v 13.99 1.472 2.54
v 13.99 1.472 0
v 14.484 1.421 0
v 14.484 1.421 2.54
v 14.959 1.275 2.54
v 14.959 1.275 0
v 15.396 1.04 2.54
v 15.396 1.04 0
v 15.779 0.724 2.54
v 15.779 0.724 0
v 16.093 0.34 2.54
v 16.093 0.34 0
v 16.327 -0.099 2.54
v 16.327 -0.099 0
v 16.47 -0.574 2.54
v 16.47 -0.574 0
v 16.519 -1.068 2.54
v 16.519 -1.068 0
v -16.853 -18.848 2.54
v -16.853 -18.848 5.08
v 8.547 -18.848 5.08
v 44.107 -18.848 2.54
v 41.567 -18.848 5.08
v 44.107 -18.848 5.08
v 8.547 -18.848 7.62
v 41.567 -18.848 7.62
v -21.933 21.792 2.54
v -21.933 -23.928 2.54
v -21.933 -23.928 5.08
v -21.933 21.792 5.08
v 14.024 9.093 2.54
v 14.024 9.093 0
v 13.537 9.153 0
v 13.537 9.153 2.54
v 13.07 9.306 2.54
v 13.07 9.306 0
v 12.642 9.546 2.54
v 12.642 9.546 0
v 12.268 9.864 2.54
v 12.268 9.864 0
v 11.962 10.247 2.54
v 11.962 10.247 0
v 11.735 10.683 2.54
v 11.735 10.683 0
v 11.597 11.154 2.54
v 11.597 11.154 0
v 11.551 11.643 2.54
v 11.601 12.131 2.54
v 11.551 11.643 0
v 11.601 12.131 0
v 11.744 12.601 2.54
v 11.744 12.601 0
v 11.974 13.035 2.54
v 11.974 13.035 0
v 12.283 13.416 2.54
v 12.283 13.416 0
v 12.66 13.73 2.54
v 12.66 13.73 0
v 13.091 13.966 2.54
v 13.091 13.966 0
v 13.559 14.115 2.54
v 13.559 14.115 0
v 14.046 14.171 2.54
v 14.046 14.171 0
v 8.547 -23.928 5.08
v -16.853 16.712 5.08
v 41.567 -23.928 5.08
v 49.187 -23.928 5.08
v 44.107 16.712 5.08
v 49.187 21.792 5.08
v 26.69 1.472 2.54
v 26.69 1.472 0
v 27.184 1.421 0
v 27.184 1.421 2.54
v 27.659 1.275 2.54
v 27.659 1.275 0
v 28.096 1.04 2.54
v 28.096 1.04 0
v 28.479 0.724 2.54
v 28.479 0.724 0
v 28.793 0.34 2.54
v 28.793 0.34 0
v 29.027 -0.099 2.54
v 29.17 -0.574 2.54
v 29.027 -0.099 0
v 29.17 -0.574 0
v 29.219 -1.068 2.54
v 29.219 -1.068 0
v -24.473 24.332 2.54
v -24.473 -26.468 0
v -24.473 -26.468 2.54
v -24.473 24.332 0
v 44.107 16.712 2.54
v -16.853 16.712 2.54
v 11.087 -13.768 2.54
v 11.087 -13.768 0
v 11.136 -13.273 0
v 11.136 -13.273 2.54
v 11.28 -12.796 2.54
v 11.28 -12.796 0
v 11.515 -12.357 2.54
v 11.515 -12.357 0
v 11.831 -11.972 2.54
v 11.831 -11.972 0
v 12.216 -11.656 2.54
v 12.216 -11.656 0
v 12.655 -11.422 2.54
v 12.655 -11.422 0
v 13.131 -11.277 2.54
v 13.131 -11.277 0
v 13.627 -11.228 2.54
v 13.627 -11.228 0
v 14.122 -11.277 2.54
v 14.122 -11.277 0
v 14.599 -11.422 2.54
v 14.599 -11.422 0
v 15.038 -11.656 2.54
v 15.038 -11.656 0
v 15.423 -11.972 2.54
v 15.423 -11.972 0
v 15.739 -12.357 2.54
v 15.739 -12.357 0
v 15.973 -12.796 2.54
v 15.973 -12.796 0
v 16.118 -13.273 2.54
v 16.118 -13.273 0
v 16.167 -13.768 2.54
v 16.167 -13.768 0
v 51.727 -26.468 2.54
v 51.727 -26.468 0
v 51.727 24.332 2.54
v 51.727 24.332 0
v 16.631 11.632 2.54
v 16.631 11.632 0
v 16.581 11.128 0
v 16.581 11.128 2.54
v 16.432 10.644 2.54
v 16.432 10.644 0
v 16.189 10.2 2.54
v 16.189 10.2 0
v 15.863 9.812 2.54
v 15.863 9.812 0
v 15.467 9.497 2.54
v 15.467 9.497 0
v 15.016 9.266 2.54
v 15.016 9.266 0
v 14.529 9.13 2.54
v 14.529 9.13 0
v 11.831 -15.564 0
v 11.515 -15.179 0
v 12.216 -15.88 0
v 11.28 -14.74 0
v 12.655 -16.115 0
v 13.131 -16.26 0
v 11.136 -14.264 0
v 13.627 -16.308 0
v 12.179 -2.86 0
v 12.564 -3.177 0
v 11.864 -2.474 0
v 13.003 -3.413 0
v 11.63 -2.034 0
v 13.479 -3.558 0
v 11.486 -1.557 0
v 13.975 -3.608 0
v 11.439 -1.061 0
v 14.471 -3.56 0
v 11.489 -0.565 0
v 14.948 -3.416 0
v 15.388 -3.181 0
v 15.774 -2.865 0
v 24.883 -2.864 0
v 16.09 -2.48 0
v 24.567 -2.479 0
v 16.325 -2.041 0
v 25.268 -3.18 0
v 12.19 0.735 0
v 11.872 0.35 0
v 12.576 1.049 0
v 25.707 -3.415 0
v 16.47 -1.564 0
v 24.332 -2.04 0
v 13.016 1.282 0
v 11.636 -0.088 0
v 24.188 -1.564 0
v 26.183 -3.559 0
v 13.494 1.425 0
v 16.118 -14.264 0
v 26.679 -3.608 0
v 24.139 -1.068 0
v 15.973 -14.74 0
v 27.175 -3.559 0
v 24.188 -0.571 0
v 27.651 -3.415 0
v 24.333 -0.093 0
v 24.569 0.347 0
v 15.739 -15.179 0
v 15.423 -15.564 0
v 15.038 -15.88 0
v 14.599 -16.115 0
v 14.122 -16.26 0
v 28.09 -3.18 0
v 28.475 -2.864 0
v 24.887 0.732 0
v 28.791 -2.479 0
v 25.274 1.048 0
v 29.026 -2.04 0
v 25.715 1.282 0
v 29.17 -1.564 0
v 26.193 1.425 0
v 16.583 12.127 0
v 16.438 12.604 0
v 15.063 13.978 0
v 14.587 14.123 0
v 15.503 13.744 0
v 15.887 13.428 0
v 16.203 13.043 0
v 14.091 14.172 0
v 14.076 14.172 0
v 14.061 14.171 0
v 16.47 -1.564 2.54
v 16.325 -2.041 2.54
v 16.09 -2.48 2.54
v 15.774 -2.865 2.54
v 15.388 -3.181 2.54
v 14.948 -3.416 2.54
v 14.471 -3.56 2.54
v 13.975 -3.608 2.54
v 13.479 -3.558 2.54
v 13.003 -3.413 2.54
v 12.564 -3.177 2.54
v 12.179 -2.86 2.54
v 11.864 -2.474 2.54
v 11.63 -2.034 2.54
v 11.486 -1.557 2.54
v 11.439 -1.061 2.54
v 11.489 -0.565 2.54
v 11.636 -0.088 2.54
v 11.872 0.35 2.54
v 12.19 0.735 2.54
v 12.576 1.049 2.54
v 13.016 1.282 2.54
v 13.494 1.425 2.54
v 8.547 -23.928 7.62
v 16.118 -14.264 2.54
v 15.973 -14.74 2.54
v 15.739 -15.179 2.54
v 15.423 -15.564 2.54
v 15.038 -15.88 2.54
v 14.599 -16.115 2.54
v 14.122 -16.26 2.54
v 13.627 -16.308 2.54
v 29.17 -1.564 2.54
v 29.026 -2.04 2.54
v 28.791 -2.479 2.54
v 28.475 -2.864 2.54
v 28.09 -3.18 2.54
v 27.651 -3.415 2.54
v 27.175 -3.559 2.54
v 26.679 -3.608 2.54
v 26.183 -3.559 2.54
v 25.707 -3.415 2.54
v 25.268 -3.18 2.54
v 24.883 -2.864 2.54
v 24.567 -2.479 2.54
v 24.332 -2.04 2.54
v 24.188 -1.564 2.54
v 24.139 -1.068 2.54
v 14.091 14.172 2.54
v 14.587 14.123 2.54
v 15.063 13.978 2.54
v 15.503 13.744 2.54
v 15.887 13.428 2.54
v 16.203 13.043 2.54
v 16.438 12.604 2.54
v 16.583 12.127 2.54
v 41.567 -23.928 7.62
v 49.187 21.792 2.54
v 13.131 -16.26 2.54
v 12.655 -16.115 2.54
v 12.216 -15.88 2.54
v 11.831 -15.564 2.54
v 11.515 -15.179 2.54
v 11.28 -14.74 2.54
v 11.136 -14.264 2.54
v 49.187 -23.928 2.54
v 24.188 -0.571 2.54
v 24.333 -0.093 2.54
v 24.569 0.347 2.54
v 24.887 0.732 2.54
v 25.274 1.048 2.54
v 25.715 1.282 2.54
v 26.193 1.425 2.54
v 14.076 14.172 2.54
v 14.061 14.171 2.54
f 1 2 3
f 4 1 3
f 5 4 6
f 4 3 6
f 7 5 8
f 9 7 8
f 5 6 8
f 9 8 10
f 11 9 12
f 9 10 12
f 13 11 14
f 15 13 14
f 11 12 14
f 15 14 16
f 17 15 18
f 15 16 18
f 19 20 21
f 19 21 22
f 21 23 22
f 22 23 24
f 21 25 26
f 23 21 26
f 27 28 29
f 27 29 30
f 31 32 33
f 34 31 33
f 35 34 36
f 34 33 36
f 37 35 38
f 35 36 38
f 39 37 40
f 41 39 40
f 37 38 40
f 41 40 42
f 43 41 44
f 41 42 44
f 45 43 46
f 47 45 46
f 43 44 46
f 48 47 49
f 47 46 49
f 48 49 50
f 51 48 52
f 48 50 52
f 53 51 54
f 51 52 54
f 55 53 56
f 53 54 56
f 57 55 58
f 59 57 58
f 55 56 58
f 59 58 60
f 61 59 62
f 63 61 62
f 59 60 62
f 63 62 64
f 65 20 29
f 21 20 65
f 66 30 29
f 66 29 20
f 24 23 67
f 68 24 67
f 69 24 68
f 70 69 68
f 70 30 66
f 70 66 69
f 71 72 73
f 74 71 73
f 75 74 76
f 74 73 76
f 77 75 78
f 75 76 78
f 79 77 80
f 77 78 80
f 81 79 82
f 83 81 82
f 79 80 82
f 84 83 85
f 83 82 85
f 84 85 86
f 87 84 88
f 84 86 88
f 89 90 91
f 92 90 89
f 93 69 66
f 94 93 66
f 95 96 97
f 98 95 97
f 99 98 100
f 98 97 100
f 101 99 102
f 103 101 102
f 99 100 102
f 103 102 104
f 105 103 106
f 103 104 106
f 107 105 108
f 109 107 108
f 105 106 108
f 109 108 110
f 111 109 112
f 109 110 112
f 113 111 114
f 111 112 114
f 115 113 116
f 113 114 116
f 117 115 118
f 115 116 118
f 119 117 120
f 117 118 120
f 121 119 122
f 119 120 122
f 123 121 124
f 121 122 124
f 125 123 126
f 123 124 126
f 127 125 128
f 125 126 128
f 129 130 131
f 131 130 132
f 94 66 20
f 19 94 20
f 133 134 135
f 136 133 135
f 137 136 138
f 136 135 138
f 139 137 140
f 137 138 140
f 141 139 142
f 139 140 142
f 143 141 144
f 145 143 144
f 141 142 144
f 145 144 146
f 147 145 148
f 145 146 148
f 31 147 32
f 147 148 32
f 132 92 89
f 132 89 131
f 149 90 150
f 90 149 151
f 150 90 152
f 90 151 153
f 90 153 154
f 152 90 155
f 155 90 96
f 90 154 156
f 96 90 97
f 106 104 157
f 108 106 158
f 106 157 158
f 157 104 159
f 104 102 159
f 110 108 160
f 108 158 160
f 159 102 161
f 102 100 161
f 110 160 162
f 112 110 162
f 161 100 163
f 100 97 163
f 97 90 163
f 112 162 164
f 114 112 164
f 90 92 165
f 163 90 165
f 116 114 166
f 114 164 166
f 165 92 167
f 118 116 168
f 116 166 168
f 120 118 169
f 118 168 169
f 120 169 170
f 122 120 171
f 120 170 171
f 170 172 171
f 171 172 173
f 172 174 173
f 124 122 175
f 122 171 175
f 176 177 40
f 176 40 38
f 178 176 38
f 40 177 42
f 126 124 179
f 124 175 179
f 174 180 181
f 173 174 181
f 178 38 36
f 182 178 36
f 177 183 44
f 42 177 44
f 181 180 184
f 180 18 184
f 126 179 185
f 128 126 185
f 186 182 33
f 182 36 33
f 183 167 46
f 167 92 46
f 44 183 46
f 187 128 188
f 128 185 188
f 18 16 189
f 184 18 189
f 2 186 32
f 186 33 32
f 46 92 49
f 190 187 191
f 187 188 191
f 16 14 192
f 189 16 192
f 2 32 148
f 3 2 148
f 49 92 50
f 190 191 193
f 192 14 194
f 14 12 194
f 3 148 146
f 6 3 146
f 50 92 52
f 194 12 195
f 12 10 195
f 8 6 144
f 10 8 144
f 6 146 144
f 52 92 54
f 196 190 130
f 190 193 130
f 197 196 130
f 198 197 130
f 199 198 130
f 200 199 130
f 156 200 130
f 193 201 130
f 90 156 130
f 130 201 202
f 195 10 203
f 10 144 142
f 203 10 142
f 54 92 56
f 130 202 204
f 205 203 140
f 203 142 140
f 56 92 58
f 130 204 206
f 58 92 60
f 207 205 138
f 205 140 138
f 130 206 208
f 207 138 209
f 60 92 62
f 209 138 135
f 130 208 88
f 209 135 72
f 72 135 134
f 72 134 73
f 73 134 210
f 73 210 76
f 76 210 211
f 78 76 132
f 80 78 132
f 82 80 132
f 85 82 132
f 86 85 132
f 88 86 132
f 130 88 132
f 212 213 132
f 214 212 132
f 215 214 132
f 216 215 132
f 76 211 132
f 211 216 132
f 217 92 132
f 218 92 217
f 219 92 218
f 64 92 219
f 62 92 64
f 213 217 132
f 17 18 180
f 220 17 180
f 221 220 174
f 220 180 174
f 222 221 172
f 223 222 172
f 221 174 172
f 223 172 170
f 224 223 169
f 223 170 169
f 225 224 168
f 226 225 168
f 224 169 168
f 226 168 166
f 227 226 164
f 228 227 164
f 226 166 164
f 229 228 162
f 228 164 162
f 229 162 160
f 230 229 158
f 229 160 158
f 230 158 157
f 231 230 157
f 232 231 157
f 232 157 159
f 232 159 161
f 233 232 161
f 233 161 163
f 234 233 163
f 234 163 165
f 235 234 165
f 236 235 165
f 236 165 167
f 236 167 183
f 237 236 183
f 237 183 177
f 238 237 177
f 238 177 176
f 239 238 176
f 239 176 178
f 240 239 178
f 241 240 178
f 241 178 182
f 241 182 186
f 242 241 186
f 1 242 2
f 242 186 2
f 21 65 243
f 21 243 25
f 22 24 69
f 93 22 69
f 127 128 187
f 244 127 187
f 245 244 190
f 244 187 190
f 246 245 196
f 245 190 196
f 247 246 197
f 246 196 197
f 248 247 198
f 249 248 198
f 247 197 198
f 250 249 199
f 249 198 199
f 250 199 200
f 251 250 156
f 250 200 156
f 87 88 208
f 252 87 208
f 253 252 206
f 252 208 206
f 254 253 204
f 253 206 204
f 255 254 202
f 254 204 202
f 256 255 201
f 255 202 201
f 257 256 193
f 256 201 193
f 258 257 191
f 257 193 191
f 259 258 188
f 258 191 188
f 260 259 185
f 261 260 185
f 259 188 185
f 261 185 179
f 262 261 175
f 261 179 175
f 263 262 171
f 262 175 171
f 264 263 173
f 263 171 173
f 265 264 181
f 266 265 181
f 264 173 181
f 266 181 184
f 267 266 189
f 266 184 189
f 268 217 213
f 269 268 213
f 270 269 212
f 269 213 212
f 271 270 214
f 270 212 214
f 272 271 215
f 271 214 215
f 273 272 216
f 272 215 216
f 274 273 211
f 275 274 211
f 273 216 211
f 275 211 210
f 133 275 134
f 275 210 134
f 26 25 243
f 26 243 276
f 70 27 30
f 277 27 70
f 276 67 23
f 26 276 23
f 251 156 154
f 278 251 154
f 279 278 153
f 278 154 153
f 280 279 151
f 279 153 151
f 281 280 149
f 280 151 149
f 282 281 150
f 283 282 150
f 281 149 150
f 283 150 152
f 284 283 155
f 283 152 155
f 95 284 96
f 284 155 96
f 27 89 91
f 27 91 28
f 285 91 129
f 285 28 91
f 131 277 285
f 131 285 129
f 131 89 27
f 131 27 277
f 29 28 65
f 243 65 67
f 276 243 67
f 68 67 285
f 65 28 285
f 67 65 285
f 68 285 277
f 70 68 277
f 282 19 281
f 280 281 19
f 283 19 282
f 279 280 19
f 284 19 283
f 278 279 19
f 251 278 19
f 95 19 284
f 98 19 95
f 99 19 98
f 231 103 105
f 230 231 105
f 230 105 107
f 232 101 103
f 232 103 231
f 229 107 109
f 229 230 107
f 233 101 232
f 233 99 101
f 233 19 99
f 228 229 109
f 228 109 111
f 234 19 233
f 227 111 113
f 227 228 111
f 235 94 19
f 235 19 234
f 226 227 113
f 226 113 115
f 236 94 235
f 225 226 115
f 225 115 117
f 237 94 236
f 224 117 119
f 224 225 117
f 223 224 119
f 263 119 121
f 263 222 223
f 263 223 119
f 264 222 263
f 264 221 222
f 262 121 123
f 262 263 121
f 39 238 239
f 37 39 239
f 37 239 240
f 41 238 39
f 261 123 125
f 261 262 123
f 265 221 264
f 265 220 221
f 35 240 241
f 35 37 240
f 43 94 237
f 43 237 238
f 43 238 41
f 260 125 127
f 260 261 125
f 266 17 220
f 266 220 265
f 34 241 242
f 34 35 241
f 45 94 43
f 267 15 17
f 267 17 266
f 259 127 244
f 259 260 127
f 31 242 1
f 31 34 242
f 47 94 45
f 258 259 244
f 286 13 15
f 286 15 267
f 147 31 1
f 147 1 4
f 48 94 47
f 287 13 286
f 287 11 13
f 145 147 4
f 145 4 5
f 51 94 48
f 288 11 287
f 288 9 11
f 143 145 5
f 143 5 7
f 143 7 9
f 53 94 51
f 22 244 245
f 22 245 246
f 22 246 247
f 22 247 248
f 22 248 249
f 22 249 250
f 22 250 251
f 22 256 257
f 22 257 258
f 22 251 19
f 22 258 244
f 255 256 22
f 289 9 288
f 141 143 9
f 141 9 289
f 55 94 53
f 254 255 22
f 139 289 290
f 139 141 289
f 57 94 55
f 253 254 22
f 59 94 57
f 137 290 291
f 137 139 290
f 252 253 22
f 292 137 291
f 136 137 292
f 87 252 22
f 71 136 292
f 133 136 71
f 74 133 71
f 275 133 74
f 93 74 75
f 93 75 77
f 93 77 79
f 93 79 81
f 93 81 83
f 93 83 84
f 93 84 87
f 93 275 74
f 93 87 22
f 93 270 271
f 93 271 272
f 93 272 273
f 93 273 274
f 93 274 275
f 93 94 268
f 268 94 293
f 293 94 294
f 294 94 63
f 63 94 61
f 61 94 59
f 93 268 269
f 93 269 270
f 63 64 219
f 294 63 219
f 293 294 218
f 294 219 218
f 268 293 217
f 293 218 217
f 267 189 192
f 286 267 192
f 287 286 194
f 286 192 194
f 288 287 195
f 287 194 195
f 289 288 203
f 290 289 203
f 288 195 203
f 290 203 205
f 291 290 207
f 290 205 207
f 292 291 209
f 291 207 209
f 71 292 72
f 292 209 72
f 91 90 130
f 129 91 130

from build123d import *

# Parameters (mm, degrees)
F0_W     = 76.2
F0_H     = 50.8
F1_DEPTH = 2.54
F2_W     = 71.12
F2_H     = 45.72
F3_DEPTH = 2.54
F4_W     = 33.02
F4_H     = 5.08
F5_DEPTH = 2.54
F7_DEPTH = 2.54
F9_DEPTH = 25.4


with BuildPart() as f1:
    # F0 (on Top) → F1 (new body)
    with BuildSketch(Plane.XY):
        with Locations((13.626695, -1.068337)):
            Rectangle(F0_W, F0_H)
    extrude(amount=F1_DEPTH)

    # F2 (on face) → F3 (join)
    with BuildSketch(Plane.XY.offset(2.54)):
        with Locations((13.626695, -1.068337)):
            Rectangle(F2_W, F2_H)
    extrude(amount=F3_DEPTH)

    # F4 (on face) → F5 (join)
    with BuildSketch(Plane.XY.offset(5.08)):
        with Locations((25.056695, -21.388337)):
            Rectangle(F4_W, F4_H)
    extrude(amount=F5_DEPTH)

    # F6 (on face) → F7 (cut)
    with BuildSketch(Plane.XY.offset(5.08)):
        Polygon((44.106695, 16.711663), (-16.853305, 16.711663), (-16.853305, -18.848337), (8.546695, -18.848337), (41.566695, -18.848337), (44.106695, -18.848337), align=None)
    extrude(amount=-F7_DEPTH, mode=Mode.SUBTRACT)

    # F8 (on face) → F9 (cut)
    with BuildSketch(Plane(origin=(0, 0, 0), x_dir=(1, 0, 0), z_dir=(0, 0, -1))):
        with BuildLine():
            Line((13.626695, 13.768337), (13.626695, 16.308337))
            ThreePointArc((13.626695, 16.308337), (11.830644, 15.564388), (11.086695, 13.768337))
            Line((11.086695, 13.768337), (13.626695, 13.768337))
        make_face()
        with BuildLine():
            ThreePointArc((11.086695, 13.768337), (13.626695, 11.228337), (16.166695, 13.768337))
            ThreePointArc((16.166695, 13.768337), (15.422746, 15.564388), (13.626695, 16.308337))
            Line((13.626695, 16.308337), (13.626695, 13.768337))
            Line((13.626695, 13.768337), (11.086695, 13.768337))
        make_face()
        with BuildLine():
            Line((13.978975, 1.068088), (13.990214, -1.471887))
            ThreePointArc((13.990214, -1.471887), (15.778995, -0.723985), (16.518975, 1.068088))
            Line((16.518975, 1.068088), (13.978975, 1.068088))
        make_face()
        with BuildLine():
            ThreePointArc((16.518975, 1.068088), (12.178954, 2.860161), (13.990214, -1.471887))
            Line((13.990214, -1.471887), (13.978975, 1.068088))
            Line((13.978975, 1.068088), (16.518975, 1.068088))
        make_face()
        with BuildLine():
            ThreePointArc((14.046408, -14.171265), (14.068887, -14.171564), (14.091368, -14.171663))
            ThreePointArc((14.091368, -14.171663), (15.887419, -13.427715), (16.631368, -11.631663))
            ThreePointArc((16.631368, -11.631663), (15.863418, -9.811927), (14.023935, -9.092559))
            Line((14.023935, -9.092559), (14.046408, -14.171265))
        make_face()
        with BuildLine():
            ThreePointArc((14.023935, -9.092559), (11.551393, -11.642903), (14.046408, -14.171265))
            Line((14.046408, -14.171265), (14.023935, -9.092559))
        make_face()
        with BuildLine():
            Line((26.678975, 1.068088), (26.690214, -1.471887))
            ThreePointArc((26.690214, -1.471887), (28.478995, -0.723985), (29.218975, 1.068088))
            ThreePointArc((29.218975, 1.068088), (26.678975, 3.608088), (24.138975, 1.068088))
            Line((24.138975, 1.068088), (26.678975, 1.068088))
        make_face()
        with BuildLine():
            ThreePointArc((24.138975, 1.068088), (24.886902, -0.731933), (26.690214, -1.471887))
            Line((26.690214, -1.471887), (26.678975, 1.068088))
            Line((26.678975, 1.068088), (24.138975, 1.068088))
        make_face()
    extrude(amount=-F9_DEPTH, mode=Mode.SUBTRACT)


solid = f1.part
